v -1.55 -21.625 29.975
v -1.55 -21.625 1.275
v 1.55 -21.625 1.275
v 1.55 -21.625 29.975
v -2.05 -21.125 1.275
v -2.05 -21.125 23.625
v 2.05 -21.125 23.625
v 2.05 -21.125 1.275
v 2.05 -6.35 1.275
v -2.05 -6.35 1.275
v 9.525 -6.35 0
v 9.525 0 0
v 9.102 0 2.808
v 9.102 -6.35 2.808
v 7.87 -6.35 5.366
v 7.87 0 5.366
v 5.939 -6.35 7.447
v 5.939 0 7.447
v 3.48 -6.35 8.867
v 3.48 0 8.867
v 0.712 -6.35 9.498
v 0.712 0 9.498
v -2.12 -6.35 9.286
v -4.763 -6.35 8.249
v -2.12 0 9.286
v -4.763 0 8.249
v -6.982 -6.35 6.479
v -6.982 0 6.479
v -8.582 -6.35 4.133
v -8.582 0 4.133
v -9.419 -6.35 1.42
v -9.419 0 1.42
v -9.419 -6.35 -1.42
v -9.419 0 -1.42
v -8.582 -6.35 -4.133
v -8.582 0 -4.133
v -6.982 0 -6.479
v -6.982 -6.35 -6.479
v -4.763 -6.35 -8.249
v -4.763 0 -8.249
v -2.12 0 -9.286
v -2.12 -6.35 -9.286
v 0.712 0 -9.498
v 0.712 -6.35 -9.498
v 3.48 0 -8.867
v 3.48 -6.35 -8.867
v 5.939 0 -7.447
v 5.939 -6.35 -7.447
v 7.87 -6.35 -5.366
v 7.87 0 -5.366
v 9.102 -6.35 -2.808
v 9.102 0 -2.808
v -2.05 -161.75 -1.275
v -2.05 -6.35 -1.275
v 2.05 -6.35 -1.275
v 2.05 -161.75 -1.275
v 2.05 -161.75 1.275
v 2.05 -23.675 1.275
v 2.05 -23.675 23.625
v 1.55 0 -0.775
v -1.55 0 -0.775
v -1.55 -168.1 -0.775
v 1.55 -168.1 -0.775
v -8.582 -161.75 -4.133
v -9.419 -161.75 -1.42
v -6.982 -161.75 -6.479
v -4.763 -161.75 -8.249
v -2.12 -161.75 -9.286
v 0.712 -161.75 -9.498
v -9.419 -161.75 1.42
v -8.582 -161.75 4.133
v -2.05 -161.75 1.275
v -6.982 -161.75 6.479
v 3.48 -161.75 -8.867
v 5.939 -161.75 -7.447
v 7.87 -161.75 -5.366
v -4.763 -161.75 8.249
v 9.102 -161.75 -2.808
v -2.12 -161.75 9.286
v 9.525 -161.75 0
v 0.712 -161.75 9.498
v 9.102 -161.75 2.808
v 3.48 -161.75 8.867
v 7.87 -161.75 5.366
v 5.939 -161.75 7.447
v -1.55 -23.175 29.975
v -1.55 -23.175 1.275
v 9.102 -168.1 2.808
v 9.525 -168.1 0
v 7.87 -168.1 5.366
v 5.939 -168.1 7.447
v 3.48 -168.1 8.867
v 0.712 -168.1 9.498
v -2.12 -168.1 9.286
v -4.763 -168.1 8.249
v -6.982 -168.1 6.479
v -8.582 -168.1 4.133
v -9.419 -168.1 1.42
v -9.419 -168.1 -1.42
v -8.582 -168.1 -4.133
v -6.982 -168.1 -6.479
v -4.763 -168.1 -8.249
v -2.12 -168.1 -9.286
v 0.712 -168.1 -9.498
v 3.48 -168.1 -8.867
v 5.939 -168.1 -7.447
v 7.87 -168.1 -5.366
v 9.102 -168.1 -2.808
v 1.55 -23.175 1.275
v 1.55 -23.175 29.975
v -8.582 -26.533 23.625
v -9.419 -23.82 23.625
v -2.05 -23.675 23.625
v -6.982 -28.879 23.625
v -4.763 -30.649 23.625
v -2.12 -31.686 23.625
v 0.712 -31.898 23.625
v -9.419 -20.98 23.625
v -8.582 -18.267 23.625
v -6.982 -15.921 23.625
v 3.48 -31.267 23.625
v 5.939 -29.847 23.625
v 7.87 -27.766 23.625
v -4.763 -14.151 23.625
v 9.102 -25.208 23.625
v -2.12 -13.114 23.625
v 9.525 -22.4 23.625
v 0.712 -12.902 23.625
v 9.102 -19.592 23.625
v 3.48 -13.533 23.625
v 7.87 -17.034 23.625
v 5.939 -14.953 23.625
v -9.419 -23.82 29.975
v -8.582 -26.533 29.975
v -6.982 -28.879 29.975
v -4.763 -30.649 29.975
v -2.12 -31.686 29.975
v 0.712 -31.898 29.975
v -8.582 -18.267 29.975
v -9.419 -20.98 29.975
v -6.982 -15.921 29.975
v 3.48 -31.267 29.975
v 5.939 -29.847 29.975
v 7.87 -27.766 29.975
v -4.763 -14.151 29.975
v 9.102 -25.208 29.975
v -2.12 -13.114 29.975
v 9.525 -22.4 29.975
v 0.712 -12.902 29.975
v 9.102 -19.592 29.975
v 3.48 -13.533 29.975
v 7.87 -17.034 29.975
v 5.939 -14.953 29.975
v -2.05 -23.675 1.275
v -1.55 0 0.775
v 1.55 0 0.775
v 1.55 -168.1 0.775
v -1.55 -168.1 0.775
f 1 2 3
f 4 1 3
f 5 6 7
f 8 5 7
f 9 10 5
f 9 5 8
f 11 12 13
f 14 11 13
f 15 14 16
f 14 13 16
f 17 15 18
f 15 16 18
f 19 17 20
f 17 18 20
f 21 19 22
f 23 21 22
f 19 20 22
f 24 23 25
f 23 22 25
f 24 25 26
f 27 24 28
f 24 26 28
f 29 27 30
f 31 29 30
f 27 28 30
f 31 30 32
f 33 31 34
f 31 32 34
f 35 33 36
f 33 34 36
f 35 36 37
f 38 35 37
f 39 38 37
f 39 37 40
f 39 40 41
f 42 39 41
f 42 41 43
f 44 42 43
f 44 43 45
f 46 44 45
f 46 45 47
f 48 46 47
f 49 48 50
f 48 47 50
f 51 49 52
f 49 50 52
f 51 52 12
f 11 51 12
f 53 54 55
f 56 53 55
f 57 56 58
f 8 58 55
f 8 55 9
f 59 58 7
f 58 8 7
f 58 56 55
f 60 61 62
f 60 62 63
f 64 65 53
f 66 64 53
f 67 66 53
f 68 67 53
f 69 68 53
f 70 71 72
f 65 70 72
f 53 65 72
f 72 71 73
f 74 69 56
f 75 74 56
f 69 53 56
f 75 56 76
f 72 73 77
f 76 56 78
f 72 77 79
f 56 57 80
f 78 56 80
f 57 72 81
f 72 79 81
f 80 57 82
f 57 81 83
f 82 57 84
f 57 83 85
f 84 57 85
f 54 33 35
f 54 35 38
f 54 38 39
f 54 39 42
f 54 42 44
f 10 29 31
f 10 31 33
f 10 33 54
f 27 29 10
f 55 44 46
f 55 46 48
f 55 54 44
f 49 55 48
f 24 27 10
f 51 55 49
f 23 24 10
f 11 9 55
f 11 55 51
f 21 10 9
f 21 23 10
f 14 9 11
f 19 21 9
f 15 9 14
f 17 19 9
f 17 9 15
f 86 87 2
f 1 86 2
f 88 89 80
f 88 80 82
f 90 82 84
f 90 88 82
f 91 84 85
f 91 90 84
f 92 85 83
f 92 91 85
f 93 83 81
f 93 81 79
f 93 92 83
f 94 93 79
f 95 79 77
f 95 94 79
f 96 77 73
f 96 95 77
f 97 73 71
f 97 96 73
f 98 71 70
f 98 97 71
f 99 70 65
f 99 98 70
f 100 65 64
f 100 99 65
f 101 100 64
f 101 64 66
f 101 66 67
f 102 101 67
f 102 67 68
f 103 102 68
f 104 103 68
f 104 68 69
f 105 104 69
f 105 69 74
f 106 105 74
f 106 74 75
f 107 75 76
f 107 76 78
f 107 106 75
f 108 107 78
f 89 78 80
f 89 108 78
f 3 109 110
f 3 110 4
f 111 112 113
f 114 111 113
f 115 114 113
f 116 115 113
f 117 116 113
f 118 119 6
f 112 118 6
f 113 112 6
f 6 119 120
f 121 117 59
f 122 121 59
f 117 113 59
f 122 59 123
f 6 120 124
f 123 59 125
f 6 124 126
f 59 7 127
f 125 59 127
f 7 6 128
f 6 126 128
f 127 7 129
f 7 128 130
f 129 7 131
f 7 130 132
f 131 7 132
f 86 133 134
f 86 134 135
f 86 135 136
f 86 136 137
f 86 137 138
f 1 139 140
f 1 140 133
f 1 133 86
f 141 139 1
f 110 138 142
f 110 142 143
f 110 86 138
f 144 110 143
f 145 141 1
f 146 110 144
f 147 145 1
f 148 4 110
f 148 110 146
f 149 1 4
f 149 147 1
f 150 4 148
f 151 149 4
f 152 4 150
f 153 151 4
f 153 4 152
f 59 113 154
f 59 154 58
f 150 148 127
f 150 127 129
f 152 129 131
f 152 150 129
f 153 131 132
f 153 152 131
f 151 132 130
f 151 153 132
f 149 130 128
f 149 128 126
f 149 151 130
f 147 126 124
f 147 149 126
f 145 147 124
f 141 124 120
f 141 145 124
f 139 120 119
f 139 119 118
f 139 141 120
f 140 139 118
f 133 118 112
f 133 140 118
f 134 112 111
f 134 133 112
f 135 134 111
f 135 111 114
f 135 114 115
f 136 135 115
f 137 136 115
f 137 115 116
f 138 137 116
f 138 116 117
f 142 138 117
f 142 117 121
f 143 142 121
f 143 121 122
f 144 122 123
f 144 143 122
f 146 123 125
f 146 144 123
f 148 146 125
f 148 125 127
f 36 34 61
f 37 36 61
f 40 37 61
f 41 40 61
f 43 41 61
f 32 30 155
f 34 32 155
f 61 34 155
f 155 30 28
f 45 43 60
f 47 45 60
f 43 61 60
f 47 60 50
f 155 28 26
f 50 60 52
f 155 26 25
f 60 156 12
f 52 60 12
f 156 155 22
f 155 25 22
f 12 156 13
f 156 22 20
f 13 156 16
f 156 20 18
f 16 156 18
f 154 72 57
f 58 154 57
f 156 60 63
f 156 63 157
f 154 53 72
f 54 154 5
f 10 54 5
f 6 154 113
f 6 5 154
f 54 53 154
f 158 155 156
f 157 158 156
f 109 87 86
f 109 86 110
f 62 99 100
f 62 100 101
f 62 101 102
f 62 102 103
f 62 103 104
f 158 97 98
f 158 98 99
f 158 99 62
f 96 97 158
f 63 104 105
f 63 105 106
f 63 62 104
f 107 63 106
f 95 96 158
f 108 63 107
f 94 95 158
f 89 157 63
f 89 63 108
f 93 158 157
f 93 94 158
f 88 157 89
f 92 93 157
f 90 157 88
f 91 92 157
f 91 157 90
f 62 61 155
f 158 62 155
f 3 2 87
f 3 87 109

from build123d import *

# Parameters (mm, degrees)
F0_W      = 4.1
F0_H      = 2.55
F0_W_2    = 3.1
F0_H_2    = 1.55
F2_DEPTH  = 168.1
F0_R      = 9.525
F3_DEPTH  = 6.35
F6_W      = 4.1
F6_H      = 2.55
F6_W_2    = 3.1
F6_H_2    = 1.55
F7_DEPTH  = 28.7
F8_R      = 9.525
F8_W      = 4.1
F8_H      = 2.55
F9_DEPTH  = 6.35
F4_R      = 9.525
F4_W      = 4.1
F4_H      = 2.55
F10_DEPTH = 6.35


with BuildPart() as f2:
    # F0 (on Front) → F2 (new body)
    with BuildSketch(Plane.XZ):
        Rectangle(F0_W, F0_H)
        Rectangle(F0_W_2, F0_H_2, mode=Mode.SUBTRACT)
    extrude(amount=F2_DEPTH)

    # F0 (on Front) → F3 (join)
    with BuildSketch(Plane.XZ):
        Circle(F0_R)
        Rectangle(F0_W, F0_H, mode=Mode.SUBTRACT)
    extrude(amount=F3_DEPTH)

    # F6 (on offset) → F7 (join)
    with BuildSketch(Plane.XY.offset(1.275)):
        with Locations((0, -22.4)):
            Rectangle(F6_W, F6_H)
        with Locations((0, -22.4)):
            Rectangle(F6_W_2, F6_H_2, mode=Mode.SUBTRACT)
    extrude(amount=F7_DEPTH)

    # F8 (on face) → F9 (join)
    with BuildSketch(Plane.XY.offset(29.975)):
        with Locations((0, -22.4)):
            Circle(F8_R)
        with Locations((0, -22.4)):
            Rectangle(F8_W, F8_H, mode=Mode.SUBTRACT)
    extrude(amount=-F9_DEPTH)

    # F4 (on face) → F10 (join)
    with BuildSketch(Plane.XZ.offset(168.1)):
        Circle(F4_R)
        Rectangle(F4_W, F4_H, mode=Mode.SUBTRACT)
    extrude(amount=-F10_DEPTH)


solid = f2.part
